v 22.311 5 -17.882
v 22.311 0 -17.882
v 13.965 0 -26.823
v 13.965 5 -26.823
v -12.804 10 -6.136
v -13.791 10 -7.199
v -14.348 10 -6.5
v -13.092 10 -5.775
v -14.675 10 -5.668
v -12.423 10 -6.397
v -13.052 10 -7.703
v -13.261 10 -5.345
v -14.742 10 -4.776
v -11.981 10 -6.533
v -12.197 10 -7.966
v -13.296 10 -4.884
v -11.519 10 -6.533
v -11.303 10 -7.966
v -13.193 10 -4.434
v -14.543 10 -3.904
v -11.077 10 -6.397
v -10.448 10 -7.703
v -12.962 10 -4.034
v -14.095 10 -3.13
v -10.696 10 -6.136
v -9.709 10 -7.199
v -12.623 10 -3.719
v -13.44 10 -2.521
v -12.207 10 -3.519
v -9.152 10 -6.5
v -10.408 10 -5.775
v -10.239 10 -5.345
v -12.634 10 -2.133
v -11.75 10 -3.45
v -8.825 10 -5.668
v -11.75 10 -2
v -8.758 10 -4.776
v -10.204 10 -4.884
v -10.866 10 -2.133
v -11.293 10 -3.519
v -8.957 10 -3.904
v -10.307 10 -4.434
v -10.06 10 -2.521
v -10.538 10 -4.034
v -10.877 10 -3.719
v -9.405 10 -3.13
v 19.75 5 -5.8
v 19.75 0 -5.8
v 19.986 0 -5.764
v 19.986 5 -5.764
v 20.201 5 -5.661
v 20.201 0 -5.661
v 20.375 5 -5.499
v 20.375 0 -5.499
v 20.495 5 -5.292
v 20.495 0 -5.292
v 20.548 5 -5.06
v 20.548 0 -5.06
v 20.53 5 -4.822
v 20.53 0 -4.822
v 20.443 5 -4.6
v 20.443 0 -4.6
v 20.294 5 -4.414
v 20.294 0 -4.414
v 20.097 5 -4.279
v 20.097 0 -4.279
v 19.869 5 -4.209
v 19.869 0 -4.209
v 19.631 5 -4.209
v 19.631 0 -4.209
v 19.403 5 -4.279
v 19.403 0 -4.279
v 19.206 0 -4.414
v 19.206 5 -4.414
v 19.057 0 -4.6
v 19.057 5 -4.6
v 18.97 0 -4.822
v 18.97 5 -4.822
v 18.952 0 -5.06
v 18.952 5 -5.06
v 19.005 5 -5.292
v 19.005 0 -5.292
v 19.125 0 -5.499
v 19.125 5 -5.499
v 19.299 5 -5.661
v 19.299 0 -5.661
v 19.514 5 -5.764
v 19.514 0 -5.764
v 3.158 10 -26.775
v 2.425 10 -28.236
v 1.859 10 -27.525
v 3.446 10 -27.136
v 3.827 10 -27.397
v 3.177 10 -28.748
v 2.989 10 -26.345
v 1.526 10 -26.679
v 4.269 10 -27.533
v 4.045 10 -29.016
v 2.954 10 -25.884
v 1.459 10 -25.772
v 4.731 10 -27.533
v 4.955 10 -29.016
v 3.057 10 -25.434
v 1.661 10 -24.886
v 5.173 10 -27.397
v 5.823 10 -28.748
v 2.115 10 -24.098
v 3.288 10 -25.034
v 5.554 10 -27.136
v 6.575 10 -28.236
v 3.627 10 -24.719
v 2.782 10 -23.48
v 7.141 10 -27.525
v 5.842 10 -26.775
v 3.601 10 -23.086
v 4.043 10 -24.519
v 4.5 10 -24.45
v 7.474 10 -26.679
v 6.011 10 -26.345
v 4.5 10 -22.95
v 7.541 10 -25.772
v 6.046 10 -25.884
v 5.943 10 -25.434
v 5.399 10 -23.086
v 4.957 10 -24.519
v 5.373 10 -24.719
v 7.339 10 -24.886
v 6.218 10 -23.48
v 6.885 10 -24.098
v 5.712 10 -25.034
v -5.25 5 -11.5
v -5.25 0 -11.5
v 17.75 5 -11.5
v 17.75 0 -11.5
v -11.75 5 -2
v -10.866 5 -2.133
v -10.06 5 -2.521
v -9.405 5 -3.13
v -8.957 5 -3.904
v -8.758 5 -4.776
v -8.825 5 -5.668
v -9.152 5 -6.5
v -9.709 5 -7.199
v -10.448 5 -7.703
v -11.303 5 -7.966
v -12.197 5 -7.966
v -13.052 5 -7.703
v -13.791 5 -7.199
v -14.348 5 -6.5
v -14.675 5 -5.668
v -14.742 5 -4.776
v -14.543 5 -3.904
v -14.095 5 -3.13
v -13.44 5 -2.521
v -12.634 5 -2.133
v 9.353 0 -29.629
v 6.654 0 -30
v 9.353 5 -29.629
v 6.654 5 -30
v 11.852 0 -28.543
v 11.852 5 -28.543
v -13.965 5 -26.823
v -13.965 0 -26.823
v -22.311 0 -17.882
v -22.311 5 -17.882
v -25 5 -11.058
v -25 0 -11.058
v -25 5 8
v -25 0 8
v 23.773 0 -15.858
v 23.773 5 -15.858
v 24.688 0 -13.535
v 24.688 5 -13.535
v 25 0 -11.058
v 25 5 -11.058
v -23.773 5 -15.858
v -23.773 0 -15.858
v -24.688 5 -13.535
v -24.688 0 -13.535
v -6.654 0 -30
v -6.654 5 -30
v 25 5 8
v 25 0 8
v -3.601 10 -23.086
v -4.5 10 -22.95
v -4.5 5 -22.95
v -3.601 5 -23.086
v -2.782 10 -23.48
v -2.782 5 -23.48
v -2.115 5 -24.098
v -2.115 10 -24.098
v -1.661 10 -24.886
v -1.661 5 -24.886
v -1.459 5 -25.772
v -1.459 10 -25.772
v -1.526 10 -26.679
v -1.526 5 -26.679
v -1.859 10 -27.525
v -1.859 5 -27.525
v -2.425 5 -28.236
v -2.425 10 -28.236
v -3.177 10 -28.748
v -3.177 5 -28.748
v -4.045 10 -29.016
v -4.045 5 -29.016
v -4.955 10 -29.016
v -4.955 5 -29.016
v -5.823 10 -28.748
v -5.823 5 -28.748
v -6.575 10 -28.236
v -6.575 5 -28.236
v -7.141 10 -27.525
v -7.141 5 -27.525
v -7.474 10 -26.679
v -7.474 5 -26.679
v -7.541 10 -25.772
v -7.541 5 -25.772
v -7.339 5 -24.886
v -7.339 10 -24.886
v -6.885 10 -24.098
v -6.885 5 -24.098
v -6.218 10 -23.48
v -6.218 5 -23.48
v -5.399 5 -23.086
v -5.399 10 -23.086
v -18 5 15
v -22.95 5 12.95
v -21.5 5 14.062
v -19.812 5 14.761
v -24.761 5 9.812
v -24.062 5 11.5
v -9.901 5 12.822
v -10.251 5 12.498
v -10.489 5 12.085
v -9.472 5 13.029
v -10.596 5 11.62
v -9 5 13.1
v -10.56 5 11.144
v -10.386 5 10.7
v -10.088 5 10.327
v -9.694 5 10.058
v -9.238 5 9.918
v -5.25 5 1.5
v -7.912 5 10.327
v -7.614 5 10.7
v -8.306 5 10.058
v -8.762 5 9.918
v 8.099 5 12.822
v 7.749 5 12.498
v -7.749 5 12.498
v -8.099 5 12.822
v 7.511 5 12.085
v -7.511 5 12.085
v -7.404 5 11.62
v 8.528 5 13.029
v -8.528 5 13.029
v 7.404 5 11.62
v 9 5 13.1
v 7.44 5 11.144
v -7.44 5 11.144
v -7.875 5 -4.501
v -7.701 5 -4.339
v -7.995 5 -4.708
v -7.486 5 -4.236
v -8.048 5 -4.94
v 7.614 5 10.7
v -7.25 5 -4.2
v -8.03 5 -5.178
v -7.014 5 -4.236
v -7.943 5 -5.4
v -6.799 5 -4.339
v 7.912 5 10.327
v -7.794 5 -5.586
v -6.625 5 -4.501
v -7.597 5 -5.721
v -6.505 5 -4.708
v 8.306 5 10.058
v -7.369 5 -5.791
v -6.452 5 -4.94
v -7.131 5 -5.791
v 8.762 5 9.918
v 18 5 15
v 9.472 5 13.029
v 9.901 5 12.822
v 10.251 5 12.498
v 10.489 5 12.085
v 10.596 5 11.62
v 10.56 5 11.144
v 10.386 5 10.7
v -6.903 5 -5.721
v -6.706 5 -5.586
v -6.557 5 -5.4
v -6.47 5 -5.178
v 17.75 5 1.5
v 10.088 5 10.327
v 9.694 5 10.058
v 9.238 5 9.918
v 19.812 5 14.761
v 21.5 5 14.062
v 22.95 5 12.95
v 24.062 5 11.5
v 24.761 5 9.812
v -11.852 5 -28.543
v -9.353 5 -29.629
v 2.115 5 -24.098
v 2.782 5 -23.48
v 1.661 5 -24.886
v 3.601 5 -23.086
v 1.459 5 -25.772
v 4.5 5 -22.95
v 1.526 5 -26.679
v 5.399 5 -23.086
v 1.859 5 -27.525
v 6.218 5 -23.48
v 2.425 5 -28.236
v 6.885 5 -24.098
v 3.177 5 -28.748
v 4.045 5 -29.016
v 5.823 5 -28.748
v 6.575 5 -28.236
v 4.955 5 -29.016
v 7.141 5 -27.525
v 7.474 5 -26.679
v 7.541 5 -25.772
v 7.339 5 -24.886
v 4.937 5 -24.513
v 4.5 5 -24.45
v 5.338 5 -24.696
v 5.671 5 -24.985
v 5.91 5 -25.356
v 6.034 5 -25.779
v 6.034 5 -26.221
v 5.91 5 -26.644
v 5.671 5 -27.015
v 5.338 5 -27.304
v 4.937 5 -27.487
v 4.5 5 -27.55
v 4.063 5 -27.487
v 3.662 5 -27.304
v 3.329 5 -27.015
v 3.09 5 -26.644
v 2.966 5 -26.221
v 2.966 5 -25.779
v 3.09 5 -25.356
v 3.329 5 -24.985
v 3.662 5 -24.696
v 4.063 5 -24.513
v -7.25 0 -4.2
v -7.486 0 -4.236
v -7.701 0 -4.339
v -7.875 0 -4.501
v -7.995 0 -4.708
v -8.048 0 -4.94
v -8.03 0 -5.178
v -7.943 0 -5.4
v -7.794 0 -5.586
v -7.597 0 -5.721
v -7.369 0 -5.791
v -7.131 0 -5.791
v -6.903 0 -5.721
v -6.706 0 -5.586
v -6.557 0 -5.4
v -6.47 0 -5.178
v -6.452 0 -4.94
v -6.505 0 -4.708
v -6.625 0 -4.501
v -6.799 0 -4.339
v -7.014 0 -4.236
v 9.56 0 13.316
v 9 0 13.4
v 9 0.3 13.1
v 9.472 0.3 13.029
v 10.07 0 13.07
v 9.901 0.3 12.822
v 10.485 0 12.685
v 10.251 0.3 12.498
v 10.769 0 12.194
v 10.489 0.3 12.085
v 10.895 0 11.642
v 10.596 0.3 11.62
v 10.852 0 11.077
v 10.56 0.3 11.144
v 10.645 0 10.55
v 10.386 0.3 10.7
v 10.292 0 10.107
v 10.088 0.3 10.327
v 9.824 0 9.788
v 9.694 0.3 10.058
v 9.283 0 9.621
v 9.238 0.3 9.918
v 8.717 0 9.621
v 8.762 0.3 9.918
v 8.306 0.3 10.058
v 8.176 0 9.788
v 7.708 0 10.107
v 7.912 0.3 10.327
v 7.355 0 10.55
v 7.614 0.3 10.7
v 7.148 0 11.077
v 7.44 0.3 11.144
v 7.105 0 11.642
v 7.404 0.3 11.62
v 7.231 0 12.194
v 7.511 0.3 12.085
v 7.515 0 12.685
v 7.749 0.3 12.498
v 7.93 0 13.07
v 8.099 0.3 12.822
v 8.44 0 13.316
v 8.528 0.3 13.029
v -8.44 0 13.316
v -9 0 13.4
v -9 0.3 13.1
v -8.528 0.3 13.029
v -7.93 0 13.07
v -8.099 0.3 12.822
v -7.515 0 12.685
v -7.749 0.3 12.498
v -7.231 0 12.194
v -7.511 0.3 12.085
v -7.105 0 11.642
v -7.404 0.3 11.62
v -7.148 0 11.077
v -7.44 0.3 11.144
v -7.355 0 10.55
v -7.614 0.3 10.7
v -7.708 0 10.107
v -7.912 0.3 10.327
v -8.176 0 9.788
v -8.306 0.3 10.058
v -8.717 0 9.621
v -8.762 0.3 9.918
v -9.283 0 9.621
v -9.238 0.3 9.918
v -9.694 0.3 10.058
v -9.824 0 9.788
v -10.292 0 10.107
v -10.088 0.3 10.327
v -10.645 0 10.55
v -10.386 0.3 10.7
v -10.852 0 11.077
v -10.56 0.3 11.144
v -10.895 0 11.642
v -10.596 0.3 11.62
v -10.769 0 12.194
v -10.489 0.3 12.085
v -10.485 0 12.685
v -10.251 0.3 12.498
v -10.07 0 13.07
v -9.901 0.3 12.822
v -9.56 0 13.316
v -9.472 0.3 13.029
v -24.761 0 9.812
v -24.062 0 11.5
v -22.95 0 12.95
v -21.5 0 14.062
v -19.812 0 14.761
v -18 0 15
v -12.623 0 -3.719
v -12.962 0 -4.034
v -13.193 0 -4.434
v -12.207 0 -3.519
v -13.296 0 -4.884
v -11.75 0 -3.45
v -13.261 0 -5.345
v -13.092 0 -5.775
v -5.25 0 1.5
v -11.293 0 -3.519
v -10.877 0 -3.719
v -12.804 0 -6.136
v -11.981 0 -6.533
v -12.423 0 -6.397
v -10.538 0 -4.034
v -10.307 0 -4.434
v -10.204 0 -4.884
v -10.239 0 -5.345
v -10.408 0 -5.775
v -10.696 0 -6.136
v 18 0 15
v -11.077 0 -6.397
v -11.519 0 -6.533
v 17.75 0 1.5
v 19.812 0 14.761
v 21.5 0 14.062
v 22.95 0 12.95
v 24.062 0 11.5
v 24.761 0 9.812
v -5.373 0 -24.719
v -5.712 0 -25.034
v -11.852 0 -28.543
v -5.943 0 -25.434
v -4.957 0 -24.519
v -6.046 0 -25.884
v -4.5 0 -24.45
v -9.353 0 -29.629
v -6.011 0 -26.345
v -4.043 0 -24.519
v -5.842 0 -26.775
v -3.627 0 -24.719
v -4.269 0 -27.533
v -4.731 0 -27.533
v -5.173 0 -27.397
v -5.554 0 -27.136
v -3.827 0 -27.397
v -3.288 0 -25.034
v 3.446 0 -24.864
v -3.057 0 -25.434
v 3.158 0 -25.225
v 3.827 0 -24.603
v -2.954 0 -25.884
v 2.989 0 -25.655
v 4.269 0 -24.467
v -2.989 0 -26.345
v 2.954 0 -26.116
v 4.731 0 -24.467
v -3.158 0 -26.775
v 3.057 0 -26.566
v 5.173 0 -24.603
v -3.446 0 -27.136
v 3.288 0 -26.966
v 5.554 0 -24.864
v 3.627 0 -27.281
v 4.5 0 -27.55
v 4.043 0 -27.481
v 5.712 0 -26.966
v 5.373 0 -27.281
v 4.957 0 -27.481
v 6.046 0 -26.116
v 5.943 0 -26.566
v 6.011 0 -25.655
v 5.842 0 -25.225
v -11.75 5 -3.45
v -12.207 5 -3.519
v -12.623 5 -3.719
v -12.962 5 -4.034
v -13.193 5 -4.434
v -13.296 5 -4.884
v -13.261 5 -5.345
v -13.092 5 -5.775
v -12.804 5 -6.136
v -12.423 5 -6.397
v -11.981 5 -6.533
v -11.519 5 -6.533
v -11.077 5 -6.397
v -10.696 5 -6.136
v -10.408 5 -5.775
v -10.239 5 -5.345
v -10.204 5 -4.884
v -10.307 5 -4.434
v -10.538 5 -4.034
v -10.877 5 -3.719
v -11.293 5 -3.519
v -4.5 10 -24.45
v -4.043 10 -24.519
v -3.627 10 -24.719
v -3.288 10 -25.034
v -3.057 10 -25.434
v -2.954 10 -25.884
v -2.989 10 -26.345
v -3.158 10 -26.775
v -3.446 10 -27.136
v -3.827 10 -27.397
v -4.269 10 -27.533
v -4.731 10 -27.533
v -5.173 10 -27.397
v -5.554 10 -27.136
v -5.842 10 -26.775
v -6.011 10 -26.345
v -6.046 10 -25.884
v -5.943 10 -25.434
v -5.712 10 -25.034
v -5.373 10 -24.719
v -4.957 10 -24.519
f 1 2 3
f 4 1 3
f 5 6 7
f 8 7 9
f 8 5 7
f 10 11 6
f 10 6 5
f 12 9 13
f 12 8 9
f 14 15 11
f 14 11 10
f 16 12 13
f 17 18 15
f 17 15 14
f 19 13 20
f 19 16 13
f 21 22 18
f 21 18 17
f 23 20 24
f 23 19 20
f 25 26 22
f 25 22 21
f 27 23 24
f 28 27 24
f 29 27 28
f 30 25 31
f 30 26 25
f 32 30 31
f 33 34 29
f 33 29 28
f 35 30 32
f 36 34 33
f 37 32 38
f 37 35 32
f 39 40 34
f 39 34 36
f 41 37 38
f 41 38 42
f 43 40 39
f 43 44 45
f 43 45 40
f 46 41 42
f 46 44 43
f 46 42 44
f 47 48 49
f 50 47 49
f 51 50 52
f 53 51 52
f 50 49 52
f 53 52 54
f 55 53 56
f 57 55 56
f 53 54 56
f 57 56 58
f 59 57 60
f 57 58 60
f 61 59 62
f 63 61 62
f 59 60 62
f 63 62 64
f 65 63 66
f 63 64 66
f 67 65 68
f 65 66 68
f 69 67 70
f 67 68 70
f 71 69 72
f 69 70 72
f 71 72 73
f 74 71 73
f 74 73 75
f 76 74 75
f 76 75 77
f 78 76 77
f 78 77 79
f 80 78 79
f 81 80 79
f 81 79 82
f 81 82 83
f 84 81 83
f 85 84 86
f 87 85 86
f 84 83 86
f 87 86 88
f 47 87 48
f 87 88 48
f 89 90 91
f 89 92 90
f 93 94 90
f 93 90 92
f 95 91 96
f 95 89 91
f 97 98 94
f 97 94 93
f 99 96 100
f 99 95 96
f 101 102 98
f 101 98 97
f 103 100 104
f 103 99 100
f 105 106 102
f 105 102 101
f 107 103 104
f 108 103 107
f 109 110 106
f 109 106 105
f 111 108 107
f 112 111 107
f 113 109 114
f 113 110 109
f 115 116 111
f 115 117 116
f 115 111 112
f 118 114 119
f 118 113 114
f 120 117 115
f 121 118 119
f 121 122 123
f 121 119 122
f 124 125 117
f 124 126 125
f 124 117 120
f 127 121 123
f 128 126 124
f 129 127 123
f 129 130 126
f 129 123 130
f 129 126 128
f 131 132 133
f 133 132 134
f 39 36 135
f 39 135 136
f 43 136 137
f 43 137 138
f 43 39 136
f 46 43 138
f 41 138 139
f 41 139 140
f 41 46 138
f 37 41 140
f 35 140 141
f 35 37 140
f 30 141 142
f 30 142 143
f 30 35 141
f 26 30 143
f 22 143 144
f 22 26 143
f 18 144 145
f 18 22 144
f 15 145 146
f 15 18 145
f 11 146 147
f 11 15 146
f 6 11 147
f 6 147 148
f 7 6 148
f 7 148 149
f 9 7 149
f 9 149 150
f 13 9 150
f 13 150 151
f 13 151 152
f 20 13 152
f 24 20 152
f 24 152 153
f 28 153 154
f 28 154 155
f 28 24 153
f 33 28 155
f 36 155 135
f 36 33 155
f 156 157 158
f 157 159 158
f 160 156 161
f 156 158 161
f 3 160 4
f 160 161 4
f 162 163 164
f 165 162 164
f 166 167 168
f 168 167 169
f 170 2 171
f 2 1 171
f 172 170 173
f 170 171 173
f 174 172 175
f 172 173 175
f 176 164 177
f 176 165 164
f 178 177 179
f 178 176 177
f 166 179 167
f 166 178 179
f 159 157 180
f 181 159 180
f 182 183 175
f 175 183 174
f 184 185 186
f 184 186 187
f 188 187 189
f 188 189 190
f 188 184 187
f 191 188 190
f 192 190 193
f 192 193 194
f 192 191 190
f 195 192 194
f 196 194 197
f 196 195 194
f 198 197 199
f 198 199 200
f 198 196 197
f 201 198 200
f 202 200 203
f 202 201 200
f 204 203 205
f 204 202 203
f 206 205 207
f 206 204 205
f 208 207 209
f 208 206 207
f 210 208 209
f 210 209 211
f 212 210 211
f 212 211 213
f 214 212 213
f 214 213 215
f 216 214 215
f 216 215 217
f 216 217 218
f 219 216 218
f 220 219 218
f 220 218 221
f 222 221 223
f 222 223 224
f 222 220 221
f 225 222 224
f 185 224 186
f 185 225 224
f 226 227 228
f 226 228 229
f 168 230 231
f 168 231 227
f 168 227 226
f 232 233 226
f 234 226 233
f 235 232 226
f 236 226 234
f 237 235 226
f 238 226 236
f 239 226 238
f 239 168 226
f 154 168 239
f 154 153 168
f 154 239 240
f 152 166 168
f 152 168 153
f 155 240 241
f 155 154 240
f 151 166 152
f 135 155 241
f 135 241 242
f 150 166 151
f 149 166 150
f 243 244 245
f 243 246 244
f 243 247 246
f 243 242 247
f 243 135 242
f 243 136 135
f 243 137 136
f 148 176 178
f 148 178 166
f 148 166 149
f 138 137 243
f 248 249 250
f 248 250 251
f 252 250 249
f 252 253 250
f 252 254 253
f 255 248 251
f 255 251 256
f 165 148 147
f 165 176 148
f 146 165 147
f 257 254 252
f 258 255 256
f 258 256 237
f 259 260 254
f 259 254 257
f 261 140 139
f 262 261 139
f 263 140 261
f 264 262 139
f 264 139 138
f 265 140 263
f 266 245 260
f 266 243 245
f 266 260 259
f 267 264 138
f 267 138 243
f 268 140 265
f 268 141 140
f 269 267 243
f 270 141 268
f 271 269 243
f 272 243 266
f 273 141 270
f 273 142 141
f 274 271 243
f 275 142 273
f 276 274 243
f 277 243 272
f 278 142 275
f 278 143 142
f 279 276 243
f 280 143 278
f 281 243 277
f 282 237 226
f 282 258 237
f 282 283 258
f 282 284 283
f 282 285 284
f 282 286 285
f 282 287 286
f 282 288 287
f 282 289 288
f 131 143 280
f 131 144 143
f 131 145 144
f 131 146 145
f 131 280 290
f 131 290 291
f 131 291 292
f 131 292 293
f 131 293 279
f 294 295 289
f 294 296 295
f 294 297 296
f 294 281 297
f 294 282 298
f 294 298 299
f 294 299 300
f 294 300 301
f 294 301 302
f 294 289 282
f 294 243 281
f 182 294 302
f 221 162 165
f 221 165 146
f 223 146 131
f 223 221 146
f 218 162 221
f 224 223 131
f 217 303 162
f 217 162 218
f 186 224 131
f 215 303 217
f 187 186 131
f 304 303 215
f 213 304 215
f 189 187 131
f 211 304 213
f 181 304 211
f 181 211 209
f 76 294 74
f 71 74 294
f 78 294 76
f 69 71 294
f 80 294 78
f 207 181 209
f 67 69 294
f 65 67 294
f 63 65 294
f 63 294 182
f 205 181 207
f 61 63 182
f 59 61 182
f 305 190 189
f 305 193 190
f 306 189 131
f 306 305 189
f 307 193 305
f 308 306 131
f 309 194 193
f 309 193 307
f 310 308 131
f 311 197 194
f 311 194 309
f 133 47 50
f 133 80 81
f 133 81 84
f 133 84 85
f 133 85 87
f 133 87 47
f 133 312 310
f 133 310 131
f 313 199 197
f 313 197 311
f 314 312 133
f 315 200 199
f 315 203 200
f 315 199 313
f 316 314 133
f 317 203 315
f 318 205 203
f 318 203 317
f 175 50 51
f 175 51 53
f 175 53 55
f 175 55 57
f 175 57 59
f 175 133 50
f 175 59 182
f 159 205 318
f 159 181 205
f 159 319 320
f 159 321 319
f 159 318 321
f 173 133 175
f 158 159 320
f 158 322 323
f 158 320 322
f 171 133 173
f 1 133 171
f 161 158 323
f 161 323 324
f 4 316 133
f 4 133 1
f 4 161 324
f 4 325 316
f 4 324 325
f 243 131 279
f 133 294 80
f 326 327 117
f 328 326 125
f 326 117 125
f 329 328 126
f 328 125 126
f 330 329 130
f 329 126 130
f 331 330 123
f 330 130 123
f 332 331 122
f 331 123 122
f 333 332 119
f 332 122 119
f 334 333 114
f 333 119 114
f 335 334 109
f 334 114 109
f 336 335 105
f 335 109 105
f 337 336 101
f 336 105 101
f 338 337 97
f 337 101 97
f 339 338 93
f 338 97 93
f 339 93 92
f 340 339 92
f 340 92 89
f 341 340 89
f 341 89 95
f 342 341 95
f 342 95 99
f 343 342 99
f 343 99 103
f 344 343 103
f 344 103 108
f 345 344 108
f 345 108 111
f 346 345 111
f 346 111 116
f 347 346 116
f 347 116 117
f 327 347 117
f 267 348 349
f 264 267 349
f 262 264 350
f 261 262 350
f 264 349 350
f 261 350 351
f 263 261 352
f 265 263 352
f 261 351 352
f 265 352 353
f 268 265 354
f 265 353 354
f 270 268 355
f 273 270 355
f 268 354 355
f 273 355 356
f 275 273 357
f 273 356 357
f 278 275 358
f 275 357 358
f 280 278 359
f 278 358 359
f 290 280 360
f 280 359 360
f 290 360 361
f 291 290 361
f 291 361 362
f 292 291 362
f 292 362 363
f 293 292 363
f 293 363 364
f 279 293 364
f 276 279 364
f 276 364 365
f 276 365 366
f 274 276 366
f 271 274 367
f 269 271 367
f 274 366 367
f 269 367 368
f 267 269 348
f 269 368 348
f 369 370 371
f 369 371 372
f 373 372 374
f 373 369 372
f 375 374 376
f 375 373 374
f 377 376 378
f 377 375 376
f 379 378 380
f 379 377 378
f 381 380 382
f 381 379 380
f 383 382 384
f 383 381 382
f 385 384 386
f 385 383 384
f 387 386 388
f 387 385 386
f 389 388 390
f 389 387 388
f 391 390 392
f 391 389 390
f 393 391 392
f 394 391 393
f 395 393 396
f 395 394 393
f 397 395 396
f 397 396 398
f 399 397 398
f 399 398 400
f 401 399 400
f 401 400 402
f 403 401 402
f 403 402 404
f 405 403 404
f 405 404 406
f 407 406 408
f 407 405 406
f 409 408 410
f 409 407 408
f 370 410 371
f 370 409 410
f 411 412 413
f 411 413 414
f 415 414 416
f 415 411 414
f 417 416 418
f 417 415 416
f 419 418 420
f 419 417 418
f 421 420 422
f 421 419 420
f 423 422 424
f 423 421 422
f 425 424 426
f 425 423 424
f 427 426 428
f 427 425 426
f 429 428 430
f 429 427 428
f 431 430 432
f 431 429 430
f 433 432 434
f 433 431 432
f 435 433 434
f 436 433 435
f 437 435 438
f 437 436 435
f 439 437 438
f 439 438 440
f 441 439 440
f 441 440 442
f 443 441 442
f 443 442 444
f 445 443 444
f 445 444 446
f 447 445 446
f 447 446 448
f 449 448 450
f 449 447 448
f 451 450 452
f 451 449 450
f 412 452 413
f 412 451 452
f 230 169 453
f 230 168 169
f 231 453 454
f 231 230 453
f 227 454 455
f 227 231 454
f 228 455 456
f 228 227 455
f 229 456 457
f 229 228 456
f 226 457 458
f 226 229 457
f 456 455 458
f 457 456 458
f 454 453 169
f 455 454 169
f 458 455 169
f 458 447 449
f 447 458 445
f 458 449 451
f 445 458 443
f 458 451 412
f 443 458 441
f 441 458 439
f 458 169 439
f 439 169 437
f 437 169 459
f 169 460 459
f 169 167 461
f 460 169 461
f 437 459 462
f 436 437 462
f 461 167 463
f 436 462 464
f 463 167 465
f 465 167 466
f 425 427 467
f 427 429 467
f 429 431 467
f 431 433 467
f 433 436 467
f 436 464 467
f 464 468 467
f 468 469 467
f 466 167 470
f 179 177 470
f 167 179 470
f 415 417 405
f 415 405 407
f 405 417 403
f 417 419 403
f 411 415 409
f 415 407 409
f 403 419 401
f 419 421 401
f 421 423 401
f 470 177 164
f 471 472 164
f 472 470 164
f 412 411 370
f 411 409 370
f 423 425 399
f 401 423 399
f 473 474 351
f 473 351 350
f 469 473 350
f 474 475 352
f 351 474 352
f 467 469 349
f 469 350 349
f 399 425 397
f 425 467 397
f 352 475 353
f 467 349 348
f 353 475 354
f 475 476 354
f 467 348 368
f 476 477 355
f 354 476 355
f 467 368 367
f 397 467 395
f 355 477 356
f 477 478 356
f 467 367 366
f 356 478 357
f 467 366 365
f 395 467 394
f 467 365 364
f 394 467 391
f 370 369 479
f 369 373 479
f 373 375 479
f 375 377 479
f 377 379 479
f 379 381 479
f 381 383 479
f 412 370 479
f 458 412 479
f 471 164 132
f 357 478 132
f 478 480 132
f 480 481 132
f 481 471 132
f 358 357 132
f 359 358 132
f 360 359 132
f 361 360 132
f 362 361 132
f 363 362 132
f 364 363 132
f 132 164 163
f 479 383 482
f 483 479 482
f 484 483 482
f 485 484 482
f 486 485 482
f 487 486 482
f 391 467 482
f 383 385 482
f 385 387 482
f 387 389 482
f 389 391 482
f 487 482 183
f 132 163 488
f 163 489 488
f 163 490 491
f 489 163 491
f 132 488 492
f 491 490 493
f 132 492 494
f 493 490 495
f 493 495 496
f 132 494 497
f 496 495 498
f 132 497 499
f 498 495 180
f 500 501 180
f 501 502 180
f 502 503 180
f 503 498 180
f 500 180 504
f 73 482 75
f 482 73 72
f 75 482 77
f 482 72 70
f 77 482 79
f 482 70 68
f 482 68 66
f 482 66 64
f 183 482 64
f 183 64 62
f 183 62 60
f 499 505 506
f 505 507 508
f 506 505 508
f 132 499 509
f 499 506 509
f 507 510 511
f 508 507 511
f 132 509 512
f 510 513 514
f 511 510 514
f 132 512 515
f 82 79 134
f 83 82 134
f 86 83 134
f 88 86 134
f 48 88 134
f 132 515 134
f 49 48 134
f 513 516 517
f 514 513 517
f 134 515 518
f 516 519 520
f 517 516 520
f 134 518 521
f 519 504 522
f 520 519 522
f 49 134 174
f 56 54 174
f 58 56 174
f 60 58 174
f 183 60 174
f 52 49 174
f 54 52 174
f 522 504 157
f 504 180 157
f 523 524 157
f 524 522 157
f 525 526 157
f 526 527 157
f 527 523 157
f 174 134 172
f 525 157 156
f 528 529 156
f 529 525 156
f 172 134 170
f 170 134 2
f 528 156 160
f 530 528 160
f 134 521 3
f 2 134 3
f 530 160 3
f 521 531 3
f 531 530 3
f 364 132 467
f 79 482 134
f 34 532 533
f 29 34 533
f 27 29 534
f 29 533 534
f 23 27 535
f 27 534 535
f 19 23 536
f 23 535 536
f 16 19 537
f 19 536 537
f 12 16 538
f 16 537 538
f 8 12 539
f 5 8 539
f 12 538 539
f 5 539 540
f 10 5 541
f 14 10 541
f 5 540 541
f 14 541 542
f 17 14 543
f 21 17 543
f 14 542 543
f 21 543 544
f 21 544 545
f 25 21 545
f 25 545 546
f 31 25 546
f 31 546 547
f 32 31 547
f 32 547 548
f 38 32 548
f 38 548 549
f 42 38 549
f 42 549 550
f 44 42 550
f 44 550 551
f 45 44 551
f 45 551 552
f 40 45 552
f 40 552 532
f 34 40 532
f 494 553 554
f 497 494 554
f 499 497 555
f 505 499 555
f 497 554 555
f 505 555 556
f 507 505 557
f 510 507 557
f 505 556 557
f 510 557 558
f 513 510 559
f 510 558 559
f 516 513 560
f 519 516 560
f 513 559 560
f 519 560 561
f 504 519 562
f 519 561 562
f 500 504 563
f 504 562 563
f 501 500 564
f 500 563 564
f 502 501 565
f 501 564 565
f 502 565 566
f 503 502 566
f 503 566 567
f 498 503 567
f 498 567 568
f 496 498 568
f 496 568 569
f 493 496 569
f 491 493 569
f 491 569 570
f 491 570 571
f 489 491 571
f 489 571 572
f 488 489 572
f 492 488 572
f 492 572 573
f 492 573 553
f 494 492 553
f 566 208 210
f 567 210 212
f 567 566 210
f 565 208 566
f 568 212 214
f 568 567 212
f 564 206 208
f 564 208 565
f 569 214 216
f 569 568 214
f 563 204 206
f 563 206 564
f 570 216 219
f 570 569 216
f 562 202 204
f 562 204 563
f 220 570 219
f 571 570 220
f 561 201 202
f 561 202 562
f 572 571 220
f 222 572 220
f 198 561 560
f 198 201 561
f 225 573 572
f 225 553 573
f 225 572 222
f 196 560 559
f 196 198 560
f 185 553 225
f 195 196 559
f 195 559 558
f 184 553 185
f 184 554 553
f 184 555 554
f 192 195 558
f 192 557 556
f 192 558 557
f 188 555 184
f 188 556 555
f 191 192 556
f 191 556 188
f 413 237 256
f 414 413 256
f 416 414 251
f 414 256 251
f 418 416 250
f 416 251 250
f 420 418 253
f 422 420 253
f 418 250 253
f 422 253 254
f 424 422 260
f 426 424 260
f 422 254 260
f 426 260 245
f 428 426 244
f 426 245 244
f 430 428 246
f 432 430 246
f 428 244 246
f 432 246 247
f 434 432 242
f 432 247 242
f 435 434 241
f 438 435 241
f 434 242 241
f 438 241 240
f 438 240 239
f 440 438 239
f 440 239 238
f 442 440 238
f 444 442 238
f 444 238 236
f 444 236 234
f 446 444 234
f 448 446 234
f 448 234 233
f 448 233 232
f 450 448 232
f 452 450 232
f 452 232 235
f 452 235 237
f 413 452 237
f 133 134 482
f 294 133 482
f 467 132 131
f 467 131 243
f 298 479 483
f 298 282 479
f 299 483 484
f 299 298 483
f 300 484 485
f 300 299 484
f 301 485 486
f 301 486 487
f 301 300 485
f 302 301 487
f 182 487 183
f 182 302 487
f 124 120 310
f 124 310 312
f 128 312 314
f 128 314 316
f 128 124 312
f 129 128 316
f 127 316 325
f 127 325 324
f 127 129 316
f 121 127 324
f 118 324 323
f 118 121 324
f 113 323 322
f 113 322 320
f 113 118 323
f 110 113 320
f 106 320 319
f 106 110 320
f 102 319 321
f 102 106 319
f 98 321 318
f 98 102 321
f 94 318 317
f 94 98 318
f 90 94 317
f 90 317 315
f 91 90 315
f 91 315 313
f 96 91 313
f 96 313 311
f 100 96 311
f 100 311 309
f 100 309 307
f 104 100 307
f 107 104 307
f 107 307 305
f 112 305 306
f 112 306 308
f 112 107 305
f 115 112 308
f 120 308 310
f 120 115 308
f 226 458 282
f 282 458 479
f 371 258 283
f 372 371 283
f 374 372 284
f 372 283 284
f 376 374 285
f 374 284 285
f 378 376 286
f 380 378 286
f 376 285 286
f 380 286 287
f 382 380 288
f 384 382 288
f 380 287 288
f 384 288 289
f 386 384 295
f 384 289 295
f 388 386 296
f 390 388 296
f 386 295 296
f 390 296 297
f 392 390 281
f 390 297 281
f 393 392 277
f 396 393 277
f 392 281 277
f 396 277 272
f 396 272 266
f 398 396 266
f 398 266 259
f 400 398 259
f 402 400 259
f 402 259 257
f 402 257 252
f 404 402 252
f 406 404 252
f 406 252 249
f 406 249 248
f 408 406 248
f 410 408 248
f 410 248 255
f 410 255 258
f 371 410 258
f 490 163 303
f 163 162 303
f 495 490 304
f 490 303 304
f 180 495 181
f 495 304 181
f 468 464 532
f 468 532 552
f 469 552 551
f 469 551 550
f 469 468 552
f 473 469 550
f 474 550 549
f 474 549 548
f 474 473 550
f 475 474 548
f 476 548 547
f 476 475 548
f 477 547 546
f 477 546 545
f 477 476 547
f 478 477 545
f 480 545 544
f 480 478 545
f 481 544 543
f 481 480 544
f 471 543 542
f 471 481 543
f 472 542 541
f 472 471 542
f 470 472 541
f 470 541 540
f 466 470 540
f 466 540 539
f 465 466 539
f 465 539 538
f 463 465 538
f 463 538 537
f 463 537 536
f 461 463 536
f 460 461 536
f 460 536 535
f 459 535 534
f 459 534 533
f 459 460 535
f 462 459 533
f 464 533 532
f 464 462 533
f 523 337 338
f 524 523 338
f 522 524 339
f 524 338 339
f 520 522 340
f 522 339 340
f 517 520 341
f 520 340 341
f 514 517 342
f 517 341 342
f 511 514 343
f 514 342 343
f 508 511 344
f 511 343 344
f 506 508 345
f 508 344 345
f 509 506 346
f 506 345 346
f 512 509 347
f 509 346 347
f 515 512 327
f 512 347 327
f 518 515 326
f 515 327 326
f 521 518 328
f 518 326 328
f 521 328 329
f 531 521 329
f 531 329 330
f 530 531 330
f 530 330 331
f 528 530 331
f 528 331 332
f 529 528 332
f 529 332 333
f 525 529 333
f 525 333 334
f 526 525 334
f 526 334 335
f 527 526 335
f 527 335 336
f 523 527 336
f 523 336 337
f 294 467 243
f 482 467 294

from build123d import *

# Parameters (mm, degrees)
SKETCH_1_R          = 1.55
EXTRUDE_1_DEPTH     = 5
SKETCH_2_R          = 1.55
CUT_EXTRUDE_1_DEPTH = 5
FILLET_1_R          = 10
SKETCH_4_R          = 0.8
SKETCH_4_W          = 23
SKETCH_4_H          = 13
SKETCH_4_R_2        = 1.55
CUT_EXTRUDE_2_DEPTH = 5
EXTRUDE_START       = 5
SKETCH_5_R          = 3.05
SKETCH_5_R_2        = 1.55
SKETCH_5_R_3        = 3
EXTRUDE_2_DEPTH     = 5
SKETCH_8_R          = 1.55
CUT_EXTRUDE_4_DEPTH = 11
SKETCH_6_R          = 1.6
CUT_EXTRUDE_6_DEPTH = 10
CHAMFER_1_SIZE      = 0.3
FILLET_2_R          = 7


with BuildPart() as part:
    # 草图1 → 凸台-拉伸1 (new body)
    with BuildSketch(Plane(origin=(0, 0, 0), x_dir=(1, 0, 0), z_dir=(0, 1, 0))):
        Polygon((-11, 30), (-25, 15), (-25, -15), (25, -15), (25, 15), (11, 30), align=None)
        with Locations(Location((-11.75, 5, 0), (0, 0, 270))):
            Circle(SKETCH_1_R, mode=Mode.SUBTRACT)
        with Locations(Location((11.75, 5, 0), (0, 0, 90))):
            Circle(SKETCH_1_R, mode=Mode.SUBTRACT)
    extrude(amount=EXTRUDE_1_DEPTH)

    # 草图2 → 切除-拉伸1 (cut)
    with BuildSketch(Plane(origin=(0, 5, 0), x_dir=(1, 0, 0), z_dir=(0, 1, 0))):
        with Locations(Location((-4.5, 26, 0), (0, 0, 270))):
            Circle(SKETCH_2_R)
        with Locations(Location((4.5, 26, 0), (0, 0, 90))):
            Circle(SKETCH_2_R)
    extrude(amount=-CUT_EXTRUDE_1_DEPTH, mode=Mode.SUBTRACT)

    # 圆角1
    fillet_1_edges = [part.edges().sort_by_distance(p)[0] for p in [
        (-25, 2.5, -15),
        (-11, 2.5, -30),
        (11, 2.5, -30),
        (25, 2.5, -15),
    ]]
    fillet(fillet_1_edges, radius=FILLET_1_R)

    # 草图4 → 切除-拉伸2 (cut)
    # profile 1 of 3: a face of its own
    with BuildSketch(Plane.XZ):
        with Locations(Location((19.75, -5, 0), (0, 0, 270))):
            Circle(SKETCH_4_R)
    # profile 2 of 3: a face of its own
    with BuildSketch(Plane.XZ):
        with Locations(Location((-7.25, -5, 0), (0, 0, 90))):
            Circle(SKETCH_4_R)
    # profile 3 of 3: a face of its own
    with BuildSketch(Plane.XZ):
        with Locations((6.25, -5)):
            Rectangle(SKETCH_4_W, SKETCH_4_H)
        with Locations((11.75, -5)):
            Circle(SKETCH_4_R_2, mode=Mode.SUBTRACT)
    extrude(amount=-CUT_EXTRUDE_2_DEPTH, mode=Mode.SUBTRACT)

    # 草图5 → 凸台-拉伸2 (add)
    # profile 1 of 3: a face of its own
    with BuildSketch(Plane(origin=(0, 5, 0), x_dir=(1, 0, 0), z_dir=(0, 1, 0)).offset(EXTRUDE_START)):
        with Locations(Location((-4.5, 26, 0), (0, 0, 270))):
            Circle(SKETCH_5_R)
        with Locations(Location((-4.5, 26, 0), (0, 0, 270))):
            Circle(SKETCH_5_R_2, mode=Mode.SUBTRACT)
    # profile 2 of 3: a face of its own
    with BuildSketch(Plane(origin=(0, 5, 0), x_dir=(1, 0, 0), z_dir=(0, 1, 0)).offset(EXTRUDE_START)):
        with Locations(Location((4.5, 26, 0), (0, 0, 270))):
            Circle(SKETCH_5_R)
        with Locations(Location((4.5, 26, 0), (0, 0, 270))):
            Circle(SKETCH_5_R_2, mode=Mode.SUBTRACT)
    # profile 3 of 3: a face of its own
    with BuildSketch(Plane(origin=(0, 5, 0), x_dir=(1, 0, 0), z_dir=(0, 1, 0)).offset(EXTRUDE_START)):
        with Locations(Location((-11.75, 5, 0), (0, 0, 270))):
            Circle(SKETCH_5_R_3)
    extrude(amount=-EXTRUDE_2_DEPTH)

    # 草图8 → 切除-拉伸4 (cut)
    with BuildSketch(Plane.XZ):
        with Locations(Location((-11.75, -5, 0), (0, 0, 90))):
            Circle(SKETCH_8_R)
    extrude(amount=-CUT_EXTRUDE_4_DEPTH, mode=Mode.SUBTRACT)

    # 草图6 → 切除-拉伸6 (cut)
    with BuildSketch(Plane(origin=(0, 5, 0), x_dir=(1, 0, 0), z_dir=(0, 1, 0))):
        with Locations(Location((-9, -11.5, 0), (0, 0, 270))):
            Circle(SKETCH_6_R)
        with Locations(Location((9, -11.5, 0), (0, 0, 270))):
            Circle(SKETCH_6_R)
    extrude(amount=-CUT_EXTRUDE_6_DEPTH, mode=Mode.SUBTRACT)

    # 倒角1
    chamfer_1_edges = [part.edges().sort_by_distance(p)[0] for p in [
        (-9, 0, 9.9),
        (9, 0, 9.9),
    ]]
    chamfer(chamfer_1_edges, length=CHAMFER_1_SIZE)

    # 圆角2
    fillet_2_edges = [part.edges().sort_by_distance(p)[0] for p in [
        (25, 2.5, 15),
        (-25, 2.5, 15),
    ]]
    fillet(fillet_2_edges, radius=FILLET_2_R)


solid = part.part
